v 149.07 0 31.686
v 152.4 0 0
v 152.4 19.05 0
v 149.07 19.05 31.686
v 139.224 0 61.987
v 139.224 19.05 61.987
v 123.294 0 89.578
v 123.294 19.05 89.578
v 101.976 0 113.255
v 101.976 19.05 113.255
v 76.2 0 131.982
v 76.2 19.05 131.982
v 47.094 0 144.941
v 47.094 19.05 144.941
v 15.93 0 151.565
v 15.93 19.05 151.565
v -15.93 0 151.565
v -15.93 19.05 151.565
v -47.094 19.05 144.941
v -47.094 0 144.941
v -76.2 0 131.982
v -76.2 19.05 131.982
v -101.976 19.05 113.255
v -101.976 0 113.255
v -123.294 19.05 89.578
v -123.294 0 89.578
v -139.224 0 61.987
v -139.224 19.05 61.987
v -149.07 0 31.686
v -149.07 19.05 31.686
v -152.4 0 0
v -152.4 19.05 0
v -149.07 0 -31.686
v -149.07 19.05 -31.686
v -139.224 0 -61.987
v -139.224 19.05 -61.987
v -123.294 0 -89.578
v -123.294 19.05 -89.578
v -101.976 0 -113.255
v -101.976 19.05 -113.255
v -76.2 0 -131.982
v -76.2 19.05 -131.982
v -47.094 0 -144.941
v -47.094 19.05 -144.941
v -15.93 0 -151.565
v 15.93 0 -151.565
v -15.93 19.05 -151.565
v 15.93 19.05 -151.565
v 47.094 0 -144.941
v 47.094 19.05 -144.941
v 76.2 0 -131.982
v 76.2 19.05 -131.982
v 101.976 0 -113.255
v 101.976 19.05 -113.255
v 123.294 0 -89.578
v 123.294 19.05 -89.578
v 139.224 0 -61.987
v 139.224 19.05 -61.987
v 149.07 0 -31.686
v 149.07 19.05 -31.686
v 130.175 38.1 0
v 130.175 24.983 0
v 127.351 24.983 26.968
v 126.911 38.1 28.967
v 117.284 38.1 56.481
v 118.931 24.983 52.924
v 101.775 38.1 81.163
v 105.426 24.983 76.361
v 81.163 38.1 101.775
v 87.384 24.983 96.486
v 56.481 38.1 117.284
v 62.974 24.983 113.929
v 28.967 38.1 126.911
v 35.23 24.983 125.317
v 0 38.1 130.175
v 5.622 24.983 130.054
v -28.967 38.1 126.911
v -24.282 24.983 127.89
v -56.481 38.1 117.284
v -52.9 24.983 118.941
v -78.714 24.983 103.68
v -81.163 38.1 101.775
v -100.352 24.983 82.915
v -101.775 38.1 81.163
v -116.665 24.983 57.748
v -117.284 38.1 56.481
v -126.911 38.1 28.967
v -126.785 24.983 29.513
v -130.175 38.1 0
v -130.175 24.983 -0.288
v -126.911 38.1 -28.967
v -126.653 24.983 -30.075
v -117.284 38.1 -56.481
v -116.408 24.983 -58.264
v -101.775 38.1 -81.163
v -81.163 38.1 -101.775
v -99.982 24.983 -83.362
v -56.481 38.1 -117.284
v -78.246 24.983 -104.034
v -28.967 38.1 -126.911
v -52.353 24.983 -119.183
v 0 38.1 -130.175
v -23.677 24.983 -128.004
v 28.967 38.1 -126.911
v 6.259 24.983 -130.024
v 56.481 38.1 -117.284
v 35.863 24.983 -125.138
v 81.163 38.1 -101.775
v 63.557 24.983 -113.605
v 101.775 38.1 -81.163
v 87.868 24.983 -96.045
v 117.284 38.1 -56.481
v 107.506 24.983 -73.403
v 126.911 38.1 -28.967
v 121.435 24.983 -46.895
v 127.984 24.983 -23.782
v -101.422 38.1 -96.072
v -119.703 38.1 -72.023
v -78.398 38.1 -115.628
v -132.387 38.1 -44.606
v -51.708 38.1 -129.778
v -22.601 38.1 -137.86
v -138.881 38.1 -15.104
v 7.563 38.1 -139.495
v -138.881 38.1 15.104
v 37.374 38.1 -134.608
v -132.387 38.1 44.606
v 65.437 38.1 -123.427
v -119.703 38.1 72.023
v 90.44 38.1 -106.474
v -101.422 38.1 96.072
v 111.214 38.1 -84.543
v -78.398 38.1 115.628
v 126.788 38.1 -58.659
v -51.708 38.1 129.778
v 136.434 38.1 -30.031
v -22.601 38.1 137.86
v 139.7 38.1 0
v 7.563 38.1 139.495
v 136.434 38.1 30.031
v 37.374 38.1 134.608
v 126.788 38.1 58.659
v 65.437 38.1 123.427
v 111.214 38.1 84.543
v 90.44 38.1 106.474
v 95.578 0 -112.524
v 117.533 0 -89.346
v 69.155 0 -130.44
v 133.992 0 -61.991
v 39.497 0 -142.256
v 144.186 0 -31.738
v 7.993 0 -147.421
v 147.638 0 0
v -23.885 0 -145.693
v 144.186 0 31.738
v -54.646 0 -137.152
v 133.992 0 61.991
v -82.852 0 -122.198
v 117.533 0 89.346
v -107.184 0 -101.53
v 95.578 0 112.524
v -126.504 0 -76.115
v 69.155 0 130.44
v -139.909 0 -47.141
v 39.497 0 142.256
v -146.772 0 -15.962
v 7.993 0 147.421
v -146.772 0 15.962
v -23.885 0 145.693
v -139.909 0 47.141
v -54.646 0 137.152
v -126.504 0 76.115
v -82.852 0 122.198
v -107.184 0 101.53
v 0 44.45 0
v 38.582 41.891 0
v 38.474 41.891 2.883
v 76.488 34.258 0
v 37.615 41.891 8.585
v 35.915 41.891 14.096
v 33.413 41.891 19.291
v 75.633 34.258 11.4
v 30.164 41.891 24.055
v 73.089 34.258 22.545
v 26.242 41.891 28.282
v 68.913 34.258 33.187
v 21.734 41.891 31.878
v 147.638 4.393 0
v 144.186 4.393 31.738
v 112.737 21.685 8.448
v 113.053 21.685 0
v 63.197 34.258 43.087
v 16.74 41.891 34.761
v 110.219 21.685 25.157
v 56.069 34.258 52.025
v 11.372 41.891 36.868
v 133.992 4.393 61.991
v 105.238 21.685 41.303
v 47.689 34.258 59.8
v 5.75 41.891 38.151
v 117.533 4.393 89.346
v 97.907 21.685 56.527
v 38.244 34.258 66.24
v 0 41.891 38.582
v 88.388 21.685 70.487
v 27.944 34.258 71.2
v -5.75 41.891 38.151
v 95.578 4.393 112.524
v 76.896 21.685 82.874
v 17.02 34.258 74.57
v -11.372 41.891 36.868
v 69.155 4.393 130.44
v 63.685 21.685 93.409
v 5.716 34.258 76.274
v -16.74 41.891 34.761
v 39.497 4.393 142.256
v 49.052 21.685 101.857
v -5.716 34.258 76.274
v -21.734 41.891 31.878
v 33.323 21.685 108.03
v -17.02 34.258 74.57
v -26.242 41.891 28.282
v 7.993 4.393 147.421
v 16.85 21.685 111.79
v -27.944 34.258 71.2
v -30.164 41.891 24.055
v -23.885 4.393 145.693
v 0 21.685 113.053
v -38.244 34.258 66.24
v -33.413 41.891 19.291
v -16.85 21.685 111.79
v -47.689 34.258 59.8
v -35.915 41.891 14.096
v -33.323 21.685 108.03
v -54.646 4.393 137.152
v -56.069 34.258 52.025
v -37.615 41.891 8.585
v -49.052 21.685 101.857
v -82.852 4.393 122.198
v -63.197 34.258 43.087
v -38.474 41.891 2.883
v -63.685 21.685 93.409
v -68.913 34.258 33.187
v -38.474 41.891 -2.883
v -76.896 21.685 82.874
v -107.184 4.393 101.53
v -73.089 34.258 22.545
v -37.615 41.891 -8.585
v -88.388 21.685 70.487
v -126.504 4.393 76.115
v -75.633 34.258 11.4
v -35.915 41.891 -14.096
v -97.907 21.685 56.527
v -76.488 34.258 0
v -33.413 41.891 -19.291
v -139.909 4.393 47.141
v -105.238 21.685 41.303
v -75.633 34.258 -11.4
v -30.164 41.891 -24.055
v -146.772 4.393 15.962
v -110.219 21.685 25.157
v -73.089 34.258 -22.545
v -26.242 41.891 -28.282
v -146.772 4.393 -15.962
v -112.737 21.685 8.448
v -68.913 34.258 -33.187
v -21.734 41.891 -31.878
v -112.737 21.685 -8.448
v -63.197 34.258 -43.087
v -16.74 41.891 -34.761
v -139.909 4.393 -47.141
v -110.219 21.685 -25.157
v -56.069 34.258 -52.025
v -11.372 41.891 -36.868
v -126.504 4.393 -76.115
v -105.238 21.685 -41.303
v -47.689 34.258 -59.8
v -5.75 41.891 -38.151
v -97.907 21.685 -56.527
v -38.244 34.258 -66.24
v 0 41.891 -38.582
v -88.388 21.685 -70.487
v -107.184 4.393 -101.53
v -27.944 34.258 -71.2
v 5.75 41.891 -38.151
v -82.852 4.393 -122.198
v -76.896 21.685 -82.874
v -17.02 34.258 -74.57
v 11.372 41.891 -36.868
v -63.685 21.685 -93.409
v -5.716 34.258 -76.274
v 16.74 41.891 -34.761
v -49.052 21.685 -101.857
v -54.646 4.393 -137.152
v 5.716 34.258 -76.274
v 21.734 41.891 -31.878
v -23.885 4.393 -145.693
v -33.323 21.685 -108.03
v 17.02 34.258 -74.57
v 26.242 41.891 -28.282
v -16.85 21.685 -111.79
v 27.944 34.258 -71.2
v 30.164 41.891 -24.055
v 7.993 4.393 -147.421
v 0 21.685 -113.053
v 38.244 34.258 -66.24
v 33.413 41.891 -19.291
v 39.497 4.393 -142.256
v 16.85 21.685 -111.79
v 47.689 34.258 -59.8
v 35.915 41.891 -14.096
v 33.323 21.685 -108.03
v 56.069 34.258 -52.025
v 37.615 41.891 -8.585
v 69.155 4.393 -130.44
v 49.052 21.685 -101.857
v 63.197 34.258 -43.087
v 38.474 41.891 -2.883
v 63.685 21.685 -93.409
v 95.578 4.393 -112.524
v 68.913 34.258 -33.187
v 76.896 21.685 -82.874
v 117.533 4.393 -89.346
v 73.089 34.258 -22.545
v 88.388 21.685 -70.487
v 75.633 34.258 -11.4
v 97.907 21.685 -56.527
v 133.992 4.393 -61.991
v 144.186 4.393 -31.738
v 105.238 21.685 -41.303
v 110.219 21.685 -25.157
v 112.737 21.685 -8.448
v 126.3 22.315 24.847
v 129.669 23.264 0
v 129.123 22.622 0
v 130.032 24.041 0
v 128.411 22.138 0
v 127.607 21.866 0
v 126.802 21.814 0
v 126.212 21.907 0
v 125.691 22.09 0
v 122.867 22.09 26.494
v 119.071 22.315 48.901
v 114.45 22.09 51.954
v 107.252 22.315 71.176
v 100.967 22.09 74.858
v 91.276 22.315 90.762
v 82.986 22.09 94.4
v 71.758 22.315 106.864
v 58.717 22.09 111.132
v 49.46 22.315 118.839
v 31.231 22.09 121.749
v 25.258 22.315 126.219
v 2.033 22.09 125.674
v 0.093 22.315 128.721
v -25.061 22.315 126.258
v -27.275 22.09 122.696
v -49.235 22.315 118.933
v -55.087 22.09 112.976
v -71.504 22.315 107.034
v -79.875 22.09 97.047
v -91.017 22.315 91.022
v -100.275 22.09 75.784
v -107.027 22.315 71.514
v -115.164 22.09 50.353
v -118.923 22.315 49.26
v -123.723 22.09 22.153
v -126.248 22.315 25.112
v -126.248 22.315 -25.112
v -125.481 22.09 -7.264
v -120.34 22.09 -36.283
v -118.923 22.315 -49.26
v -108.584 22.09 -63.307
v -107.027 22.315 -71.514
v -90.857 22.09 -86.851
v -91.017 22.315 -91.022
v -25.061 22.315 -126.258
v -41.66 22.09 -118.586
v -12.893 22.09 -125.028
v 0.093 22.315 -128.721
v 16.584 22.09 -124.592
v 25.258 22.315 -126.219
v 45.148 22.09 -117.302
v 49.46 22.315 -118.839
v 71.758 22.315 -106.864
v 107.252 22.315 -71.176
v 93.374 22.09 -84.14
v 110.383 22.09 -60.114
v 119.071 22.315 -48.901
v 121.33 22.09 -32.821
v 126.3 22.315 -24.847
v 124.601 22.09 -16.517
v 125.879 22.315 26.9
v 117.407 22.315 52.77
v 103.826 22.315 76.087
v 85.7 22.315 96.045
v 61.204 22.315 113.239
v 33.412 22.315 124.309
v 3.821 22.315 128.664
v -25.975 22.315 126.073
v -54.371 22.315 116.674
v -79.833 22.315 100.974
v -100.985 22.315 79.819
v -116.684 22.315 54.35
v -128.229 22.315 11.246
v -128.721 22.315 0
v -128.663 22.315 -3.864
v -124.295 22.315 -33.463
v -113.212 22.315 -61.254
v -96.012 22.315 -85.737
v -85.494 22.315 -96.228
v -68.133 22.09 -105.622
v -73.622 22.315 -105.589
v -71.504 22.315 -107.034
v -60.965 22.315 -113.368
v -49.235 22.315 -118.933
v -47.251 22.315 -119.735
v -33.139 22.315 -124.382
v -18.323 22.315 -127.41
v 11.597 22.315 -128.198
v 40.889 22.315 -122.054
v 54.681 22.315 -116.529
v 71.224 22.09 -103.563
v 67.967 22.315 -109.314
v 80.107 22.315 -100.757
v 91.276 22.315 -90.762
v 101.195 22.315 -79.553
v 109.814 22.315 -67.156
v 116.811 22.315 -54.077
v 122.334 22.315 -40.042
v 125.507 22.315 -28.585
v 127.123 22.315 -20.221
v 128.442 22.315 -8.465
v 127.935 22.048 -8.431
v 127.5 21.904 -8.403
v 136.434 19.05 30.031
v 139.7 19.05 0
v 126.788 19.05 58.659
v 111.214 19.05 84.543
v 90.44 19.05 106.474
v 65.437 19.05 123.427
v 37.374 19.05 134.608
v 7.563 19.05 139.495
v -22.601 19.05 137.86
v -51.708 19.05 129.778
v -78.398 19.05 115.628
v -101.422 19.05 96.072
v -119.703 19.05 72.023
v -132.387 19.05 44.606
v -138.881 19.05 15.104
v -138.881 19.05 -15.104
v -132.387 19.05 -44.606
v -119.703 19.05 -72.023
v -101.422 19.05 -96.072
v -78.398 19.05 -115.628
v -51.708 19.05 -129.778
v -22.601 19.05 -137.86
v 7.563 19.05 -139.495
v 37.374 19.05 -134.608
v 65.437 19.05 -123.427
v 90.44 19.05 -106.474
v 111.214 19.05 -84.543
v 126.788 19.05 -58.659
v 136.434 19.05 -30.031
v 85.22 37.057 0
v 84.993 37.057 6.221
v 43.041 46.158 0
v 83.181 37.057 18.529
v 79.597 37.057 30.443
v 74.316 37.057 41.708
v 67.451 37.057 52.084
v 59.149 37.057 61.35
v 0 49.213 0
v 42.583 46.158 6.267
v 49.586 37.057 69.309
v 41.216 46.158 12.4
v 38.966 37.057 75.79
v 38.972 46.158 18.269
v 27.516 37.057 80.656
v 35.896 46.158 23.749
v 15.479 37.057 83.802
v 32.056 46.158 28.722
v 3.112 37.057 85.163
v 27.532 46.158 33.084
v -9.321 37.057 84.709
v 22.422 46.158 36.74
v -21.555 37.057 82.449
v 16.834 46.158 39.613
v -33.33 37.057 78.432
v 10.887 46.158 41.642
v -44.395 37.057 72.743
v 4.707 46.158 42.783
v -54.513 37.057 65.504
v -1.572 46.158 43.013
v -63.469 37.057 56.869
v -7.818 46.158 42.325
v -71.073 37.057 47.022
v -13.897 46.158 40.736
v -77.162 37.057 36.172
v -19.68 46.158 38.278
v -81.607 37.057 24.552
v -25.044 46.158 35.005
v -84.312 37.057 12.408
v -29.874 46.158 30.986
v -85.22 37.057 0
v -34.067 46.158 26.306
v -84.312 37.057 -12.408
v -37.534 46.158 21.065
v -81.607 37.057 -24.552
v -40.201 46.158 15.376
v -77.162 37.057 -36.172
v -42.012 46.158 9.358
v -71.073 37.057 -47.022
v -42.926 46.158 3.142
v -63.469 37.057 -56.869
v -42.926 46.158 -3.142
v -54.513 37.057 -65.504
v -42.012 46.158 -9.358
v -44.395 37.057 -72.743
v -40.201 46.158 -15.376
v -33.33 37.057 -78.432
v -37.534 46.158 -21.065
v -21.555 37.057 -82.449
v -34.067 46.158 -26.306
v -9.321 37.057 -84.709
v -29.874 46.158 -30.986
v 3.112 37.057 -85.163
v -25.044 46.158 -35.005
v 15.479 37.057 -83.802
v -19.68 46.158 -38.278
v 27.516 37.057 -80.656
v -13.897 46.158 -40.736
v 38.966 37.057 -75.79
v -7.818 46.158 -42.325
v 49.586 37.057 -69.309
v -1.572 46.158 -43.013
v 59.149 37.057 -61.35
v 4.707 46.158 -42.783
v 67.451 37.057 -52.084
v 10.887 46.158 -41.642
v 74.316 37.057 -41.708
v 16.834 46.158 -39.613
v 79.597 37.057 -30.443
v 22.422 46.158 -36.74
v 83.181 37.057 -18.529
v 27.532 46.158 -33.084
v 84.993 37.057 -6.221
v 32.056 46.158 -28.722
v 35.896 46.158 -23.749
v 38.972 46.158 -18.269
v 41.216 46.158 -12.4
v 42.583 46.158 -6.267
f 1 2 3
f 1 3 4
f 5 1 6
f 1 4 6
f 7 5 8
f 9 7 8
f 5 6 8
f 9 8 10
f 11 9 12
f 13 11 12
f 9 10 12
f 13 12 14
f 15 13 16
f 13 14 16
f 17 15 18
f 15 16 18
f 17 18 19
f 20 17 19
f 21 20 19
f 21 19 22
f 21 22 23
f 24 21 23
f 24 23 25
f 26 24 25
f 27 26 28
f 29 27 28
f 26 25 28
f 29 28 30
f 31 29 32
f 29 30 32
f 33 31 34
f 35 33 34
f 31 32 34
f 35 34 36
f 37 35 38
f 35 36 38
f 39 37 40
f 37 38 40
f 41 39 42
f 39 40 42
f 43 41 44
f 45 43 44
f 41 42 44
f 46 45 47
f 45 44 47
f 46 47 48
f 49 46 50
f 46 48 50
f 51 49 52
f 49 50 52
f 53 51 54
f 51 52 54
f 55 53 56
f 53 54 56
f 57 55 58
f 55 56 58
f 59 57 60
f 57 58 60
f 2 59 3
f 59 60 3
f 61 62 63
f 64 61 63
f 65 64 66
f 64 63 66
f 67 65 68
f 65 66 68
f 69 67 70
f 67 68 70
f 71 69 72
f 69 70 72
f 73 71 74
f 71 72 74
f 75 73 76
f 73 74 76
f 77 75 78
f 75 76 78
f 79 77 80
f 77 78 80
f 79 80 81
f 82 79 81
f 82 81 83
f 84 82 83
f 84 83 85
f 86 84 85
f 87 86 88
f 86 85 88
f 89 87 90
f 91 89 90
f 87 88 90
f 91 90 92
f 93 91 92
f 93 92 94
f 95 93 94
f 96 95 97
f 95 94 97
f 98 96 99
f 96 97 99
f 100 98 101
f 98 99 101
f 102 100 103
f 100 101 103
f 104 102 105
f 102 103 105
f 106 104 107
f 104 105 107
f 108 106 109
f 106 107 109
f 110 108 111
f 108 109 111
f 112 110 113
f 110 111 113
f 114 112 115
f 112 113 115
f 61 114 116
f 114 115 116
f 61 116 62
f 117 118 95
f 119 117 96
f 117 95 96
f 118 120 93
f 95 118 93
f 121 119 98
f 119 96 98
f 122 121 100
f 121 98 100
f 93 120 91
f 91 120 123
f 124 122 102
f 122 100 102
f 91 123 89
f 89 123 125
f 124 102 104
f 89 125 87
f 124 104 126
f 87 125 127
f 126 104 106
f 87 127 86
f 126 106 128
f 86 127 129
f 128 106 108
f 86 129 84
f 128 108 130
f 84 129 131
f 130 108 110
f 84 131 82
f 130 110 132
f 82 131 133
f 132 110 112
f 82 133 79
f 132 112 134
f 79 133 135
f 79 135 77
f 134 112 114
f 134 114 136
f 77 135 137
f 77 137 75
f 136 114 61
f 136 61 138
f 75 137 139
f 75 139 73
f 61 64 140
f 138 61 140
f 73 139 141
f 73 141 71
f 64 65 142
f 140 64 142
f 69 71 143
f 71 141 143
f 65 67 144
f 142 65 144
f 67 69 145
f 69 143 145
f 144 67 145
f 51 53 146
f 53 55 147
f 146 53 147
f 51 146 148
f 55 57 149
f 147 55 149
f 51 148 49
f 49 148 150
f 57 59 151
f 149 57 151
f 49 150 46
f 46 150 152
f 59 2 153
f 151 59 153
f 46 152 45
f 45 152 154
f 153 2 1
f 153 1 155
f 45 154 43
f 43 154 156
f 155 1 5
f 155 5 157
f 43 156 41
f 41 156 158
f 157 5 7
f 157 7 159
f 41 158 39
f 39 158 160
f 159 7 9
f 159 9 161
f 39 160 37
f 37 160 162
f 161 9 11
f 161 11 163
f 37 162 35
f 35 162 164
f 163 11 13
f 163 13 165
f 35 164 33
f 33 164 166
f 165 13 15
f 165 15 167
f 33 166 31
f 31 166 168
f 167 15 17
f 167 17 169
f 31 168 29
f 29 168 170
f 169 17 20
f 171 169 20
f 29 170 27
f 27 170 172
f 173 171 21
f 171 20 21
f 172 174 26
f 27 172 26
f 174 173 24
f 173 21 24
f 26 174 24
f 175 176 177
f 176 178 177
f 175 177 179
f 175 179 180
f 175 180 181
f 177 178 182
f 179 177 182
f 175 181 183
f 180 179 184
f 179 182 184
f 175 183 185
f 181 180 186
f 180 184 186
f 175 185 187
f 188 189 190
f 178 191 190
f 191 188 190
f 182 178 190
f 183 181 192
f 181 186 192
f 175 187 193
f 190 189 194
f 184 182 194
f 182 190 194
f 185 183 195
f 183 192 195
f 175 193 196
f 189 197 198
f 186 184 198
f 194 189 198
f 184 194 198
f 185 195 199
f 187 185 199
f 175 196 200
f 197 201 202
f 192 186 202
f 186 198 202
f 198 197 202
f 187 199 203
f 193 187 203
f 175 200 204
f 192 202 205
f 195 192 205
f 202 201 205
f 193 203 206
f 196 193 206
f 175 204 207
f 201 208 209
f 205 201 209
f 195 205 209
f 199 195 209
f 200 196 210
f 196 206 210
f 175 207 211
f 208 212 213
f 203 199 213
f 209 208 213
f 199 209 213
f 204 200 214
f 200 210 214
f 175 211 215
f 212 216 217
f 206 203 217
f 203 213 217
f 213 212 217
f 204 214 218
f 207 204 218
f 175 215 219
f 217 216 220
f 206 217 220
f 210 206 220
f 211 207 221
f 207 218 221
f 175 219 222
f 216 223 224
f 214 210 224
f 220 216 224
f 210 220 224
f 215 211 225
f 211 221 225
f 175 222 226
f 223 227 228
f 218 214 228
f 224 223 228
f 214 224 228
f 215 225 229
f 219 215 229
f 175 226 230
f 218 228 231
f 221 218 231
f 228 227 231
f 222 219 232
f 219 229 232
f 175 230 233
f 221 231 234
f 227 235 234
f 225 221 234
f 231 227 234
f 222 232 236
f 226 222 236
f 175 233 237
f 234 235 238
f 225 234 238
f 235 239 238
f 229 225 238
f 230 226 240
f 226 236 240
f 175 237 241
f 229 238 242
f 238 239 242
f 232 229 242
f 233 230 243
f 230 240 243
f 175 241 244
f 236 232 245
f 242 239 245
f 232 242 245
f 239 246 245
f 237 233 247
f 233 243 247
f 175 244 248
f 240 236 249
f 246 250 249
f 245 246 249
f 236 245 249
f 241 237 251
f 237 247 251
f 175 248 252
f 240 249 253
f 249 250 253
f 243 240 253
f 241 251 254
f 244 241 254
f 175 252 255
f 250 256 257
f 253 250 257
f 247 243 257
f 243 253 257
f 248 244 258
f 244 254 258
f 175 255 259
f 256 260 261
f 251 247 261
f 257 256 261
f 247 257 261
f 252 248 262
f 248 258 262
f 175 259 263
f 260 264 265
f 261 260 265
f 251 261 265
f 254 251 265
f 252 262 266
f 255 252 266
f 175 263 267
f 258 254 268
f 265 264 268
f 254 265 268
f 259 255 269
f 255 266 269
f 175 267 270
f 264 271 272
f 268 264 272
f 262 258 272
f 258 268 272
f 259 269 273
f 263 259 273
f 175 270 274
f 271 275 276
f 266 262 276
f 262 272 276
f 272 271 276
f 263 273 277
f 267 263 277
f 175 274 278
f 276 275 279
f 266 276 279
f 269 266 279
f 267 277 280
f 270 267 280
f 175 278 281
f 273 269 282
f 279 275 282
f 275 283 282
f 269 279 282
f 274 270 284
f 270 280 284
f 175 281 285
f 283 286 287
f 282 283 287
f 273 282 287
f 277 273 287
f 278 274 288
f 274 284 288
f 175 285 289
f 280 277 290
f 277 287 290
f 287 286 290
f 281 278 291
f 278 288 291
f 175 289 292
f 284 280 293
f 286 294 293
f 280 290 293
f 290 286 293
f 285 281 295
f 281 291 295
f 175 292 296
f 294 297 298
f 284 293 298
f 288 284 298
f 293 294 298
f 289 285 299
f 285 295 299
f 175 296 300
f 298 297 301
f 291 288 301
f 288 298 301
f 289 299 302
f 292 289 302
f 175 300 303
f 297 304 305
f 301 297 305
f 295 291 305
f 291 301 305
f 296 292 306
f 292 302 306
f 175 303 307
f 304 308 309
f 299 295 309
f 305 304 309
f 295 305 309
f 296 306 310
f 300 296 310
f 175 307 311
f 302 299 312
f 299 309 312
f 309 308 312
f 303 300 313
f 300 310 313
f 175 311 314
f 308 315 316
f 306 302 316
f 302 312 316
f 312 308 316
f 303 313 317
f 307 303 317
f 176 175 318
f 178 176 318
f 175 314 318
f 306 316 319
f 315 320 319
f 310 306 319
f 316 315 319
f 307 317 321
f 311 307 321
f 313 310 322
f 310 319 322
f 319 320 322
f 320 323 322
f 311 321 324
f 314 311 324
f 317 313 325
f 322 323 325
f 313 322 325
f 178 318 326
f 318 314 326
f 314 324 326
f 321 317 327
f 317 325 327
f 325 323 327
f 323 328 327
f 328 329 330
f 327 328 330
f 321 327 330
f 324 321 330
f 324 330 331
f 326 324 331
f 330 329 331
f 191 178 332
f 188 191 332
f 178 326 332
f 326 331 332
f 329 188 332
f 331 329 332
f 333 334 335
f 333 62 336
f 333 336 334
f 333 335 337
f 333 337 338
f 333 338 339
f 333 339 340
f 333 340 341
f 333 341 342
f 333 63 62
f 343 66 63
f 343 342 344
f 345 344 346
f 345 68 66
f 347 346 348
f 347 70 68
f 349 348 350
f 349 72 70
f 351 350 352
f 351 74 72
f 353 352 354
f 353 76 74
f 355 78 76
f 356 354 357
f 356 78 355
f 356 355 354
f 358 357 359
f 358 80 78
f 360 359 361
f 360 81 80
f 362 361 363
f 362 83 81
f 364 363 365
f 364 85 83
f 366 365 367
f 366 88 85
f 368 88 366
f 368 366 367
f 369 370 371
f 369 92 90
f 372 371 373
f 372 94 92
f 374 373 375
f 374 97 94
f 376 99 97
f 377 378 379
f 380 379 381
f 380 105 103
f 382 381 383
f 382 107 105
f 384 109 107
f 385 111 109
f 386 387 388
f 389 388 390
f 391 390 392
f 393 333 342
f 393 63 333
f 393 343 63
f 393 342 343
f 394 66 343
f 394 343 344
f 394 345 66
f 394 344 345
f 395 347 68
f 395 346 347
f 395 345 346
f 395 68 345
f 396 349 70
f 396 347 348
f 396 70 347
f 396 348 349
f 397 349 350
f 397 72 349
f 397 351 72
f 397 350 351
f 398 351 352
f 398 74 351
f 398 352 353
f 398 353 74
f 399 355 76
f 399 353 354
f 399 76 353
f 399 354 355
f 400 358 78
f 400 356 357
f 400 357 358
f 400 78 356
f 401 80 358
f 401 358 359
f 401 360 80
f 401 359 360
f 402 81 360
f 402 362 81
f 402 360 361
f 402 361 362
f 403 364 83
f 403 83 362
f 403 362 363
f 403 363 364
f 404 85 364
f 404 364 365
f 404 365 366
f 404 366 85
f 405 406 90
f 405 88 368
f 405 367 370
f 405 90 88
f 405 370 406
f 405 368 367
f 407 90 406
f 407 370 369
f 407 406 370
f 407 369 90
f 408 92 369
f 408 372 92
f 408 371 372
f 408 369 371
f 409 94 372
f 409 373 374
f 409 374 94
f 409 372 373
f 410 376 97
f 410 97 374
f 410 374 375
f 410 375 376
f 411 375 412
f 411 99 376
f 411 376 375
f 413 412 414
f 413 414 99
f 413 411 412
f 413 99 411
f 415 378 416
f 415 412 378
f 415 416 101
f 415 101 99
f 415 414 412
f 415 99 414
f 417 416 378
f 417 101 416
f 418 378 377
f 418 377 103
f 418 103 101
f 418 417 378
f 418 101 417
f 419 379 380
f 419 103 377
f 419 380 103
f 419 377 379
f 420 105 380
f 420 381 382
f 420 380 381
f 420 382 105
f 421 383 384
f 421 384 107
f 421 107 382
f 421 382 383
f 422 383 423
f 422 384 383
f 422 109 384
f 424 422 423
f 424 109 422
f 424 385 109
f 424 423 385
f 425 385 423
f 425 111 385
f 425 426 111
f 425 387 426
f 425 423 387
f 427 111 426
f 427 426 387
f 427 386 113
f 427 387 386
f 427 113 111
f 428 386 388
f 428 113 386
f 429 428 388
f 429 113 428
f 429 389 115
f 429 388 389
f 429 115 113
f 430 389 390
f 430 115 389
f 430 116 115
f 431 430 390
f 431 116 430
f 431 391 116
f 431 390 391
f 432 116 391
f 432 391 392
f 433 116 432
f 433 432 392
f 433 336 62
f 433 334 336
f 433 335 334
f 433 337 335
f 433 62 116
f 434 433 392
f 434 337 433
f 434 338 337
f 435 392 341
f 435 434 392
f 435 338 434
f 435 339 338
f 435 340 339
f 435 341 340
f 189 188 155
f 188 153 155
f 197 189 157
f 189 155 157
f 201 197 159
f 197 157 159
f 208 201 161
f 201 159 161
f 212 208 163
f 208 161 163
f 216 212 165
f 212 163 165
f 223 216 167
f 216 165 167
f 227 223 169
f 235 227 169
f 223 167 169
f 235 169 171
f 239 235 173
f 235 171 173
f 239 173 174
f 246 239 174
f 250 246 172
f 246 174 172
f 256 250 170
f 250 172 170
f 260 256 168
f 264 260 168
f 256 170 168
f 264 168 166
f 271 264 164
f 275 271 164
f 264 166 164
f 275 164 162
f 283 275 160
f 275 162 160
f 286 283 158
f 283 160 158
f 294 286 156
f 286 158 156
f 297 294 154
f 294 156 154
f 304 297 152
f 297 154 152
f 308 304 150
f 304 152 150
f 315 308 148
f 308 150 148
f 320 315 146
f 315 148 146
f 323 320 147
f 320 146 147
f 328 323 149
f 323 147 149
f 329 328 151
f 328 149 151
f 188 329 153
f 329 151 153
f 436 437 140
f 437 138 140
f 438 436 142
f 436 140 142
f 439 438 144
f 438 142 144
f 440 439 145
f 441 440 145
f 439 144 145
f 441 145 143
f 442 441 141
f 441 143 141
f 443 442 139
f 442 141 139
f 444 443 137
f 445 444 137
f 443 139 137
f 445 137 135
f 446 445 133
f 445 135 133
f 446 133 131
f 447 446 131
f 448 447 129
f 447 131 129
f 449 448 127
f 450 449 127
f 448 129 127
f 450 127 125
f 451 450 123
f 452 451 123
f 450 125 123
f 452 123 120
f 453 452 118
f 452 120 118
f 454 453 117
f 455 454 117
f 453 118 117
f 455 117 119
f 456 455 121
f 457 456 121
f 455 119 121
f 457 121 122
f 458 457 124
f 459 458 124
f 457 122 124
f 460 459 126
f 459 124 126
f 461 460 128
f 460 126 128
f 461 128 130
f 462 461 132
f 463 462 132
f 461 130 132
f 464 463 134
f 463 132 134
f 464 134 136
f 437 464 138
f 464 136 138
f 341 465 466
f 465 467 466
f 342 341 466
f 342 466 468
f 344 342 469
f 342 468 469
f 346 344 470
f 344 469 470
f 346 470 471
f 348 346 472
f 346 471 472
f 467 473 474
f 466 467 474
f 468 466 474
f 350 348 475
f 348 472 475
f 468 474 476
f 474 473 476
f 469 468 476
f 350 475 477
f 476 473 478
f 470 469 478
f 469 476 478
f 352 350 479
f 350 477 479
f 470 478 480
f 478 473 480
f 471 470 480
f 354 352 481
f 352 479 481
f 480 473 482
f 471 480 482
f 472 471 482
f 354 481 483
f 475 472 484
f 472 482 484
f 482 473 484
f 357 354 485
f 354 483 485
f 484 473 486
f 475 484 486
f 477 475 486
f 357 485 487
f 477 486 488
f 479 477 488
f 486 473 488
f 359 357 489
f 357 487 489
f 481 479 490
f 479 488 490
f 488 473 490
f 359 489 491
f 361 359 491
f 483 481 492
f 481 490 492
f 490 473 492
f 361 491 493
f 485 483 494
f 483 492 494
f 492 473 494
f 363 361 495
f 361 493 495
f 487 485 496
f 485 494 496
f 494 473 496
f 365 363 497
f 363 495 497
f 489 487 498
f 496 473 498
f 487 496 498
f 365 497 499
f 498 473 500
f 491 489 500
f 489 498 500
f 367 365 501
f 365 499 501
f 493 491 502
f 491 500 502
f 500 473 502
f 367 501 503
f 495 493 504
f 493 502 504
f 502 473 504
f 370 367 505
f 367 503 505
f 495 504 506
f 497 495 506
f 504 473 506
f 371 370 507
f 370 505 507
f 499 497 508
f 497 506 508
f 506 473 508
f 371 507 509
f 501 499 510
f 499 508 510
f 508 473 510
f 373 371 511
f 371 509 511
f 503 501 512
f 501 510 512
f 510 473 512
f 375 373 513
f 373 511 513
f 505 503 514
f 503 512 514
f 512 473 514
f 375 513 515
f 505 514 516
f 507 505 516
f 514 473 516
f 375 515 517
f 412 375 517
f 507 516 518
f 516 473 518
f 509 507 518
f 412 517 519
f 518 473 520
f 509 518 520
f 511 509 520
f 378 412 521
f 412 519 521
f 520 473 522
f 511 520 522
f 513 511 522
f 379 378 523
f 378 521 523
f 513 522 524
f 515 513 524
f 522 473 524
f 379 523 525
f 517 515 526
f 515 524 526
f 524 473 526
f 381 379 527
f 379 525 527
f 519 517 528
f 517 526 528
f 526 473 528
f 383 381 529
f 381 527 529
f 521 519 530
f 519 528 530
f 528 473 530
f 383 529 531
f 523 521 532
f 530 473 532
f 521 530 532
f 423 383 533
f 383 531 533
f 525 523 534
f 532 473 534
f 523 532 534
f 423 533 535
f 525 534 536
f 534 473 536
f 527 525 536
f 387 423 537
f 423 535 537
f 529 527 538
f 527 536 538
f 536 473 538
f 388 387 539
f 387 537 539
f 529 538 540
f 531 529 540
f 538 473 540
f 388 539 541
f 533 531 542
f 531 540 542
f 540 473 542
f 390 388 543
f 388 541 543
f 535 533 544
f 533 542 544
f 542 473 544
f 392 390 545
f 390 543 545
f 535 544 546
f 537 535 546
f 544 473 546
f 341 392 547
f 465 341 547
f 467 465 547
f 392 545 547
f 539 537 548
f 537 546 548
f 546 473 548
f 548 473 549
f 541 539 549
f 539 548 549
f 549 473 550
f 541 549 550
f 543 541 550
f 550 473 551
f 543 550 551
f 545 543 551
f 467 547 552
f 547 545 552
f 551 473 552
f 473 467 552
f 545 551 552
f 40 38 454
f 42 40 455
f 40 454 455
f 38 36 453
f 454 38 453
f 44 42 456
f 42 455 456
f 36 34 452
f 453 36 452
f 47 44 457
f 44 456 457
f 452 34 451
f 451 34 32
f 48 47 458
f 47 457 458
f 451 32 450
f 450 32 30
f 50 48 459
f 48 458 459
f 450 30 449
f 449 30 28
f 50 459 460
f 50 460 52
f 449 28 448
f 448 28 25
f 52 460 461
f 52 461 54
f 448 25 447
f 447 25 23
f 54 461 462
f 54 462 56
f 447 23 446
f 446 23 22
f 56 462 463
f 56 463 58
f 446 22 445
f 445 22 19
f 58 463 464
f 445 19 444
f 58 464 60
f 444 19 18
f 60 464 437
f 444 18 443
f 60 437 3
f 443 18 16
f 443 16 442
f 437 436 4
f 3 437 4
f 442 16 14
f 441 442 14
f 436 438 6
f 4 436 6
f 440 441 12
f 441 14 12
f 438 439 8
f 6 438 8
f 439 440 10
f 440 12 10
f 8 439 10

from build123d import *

# Parameters (mm, degrees)
FILLET1_R = 3.175


with BuildPart() as part:
    # Sketch1 → Revolve1 (revolve)
    with BuildSketch(Plane.XY):
        with BuildLine():
            Line((0, 49.2125), (0, 44.45))
            ThreePointArc((0, 44.45), (76.487596697, 34.257888417), (147.6375, 4.392811034))
            Line((147.6375, 4.392811034), (147.6375, 0))
            Line((147.6375, 0), (152.4, 0))
            Line((152.4, 0), (152.4, 19.05))
            Line((152.4, 19.05), (139.7, 19.05))
            Line((139.7, 19.05), (139.7, 38.1))
            Line((139.7, 38.1), (130.175, 38.1))
            Line((130.175, 38.1), (130.175, 20.016399419))
            ThreePointArc((130.175, 20.016399419), (66.704465582, 41.823922564), (0, 49.2125))
        make_face()
    revolve(axis=Axis((0, 49.2125, 0), (0, -1, 0)))

    # Fillet1
    fillet1_edges = [part.edges().sort_by_distance(p)[0] for p in [
        (-130.175, 20.016399419, 0),
    ]]
    fillet(fillet1_edges, radius=FILLET1_R)


solid = part.part
